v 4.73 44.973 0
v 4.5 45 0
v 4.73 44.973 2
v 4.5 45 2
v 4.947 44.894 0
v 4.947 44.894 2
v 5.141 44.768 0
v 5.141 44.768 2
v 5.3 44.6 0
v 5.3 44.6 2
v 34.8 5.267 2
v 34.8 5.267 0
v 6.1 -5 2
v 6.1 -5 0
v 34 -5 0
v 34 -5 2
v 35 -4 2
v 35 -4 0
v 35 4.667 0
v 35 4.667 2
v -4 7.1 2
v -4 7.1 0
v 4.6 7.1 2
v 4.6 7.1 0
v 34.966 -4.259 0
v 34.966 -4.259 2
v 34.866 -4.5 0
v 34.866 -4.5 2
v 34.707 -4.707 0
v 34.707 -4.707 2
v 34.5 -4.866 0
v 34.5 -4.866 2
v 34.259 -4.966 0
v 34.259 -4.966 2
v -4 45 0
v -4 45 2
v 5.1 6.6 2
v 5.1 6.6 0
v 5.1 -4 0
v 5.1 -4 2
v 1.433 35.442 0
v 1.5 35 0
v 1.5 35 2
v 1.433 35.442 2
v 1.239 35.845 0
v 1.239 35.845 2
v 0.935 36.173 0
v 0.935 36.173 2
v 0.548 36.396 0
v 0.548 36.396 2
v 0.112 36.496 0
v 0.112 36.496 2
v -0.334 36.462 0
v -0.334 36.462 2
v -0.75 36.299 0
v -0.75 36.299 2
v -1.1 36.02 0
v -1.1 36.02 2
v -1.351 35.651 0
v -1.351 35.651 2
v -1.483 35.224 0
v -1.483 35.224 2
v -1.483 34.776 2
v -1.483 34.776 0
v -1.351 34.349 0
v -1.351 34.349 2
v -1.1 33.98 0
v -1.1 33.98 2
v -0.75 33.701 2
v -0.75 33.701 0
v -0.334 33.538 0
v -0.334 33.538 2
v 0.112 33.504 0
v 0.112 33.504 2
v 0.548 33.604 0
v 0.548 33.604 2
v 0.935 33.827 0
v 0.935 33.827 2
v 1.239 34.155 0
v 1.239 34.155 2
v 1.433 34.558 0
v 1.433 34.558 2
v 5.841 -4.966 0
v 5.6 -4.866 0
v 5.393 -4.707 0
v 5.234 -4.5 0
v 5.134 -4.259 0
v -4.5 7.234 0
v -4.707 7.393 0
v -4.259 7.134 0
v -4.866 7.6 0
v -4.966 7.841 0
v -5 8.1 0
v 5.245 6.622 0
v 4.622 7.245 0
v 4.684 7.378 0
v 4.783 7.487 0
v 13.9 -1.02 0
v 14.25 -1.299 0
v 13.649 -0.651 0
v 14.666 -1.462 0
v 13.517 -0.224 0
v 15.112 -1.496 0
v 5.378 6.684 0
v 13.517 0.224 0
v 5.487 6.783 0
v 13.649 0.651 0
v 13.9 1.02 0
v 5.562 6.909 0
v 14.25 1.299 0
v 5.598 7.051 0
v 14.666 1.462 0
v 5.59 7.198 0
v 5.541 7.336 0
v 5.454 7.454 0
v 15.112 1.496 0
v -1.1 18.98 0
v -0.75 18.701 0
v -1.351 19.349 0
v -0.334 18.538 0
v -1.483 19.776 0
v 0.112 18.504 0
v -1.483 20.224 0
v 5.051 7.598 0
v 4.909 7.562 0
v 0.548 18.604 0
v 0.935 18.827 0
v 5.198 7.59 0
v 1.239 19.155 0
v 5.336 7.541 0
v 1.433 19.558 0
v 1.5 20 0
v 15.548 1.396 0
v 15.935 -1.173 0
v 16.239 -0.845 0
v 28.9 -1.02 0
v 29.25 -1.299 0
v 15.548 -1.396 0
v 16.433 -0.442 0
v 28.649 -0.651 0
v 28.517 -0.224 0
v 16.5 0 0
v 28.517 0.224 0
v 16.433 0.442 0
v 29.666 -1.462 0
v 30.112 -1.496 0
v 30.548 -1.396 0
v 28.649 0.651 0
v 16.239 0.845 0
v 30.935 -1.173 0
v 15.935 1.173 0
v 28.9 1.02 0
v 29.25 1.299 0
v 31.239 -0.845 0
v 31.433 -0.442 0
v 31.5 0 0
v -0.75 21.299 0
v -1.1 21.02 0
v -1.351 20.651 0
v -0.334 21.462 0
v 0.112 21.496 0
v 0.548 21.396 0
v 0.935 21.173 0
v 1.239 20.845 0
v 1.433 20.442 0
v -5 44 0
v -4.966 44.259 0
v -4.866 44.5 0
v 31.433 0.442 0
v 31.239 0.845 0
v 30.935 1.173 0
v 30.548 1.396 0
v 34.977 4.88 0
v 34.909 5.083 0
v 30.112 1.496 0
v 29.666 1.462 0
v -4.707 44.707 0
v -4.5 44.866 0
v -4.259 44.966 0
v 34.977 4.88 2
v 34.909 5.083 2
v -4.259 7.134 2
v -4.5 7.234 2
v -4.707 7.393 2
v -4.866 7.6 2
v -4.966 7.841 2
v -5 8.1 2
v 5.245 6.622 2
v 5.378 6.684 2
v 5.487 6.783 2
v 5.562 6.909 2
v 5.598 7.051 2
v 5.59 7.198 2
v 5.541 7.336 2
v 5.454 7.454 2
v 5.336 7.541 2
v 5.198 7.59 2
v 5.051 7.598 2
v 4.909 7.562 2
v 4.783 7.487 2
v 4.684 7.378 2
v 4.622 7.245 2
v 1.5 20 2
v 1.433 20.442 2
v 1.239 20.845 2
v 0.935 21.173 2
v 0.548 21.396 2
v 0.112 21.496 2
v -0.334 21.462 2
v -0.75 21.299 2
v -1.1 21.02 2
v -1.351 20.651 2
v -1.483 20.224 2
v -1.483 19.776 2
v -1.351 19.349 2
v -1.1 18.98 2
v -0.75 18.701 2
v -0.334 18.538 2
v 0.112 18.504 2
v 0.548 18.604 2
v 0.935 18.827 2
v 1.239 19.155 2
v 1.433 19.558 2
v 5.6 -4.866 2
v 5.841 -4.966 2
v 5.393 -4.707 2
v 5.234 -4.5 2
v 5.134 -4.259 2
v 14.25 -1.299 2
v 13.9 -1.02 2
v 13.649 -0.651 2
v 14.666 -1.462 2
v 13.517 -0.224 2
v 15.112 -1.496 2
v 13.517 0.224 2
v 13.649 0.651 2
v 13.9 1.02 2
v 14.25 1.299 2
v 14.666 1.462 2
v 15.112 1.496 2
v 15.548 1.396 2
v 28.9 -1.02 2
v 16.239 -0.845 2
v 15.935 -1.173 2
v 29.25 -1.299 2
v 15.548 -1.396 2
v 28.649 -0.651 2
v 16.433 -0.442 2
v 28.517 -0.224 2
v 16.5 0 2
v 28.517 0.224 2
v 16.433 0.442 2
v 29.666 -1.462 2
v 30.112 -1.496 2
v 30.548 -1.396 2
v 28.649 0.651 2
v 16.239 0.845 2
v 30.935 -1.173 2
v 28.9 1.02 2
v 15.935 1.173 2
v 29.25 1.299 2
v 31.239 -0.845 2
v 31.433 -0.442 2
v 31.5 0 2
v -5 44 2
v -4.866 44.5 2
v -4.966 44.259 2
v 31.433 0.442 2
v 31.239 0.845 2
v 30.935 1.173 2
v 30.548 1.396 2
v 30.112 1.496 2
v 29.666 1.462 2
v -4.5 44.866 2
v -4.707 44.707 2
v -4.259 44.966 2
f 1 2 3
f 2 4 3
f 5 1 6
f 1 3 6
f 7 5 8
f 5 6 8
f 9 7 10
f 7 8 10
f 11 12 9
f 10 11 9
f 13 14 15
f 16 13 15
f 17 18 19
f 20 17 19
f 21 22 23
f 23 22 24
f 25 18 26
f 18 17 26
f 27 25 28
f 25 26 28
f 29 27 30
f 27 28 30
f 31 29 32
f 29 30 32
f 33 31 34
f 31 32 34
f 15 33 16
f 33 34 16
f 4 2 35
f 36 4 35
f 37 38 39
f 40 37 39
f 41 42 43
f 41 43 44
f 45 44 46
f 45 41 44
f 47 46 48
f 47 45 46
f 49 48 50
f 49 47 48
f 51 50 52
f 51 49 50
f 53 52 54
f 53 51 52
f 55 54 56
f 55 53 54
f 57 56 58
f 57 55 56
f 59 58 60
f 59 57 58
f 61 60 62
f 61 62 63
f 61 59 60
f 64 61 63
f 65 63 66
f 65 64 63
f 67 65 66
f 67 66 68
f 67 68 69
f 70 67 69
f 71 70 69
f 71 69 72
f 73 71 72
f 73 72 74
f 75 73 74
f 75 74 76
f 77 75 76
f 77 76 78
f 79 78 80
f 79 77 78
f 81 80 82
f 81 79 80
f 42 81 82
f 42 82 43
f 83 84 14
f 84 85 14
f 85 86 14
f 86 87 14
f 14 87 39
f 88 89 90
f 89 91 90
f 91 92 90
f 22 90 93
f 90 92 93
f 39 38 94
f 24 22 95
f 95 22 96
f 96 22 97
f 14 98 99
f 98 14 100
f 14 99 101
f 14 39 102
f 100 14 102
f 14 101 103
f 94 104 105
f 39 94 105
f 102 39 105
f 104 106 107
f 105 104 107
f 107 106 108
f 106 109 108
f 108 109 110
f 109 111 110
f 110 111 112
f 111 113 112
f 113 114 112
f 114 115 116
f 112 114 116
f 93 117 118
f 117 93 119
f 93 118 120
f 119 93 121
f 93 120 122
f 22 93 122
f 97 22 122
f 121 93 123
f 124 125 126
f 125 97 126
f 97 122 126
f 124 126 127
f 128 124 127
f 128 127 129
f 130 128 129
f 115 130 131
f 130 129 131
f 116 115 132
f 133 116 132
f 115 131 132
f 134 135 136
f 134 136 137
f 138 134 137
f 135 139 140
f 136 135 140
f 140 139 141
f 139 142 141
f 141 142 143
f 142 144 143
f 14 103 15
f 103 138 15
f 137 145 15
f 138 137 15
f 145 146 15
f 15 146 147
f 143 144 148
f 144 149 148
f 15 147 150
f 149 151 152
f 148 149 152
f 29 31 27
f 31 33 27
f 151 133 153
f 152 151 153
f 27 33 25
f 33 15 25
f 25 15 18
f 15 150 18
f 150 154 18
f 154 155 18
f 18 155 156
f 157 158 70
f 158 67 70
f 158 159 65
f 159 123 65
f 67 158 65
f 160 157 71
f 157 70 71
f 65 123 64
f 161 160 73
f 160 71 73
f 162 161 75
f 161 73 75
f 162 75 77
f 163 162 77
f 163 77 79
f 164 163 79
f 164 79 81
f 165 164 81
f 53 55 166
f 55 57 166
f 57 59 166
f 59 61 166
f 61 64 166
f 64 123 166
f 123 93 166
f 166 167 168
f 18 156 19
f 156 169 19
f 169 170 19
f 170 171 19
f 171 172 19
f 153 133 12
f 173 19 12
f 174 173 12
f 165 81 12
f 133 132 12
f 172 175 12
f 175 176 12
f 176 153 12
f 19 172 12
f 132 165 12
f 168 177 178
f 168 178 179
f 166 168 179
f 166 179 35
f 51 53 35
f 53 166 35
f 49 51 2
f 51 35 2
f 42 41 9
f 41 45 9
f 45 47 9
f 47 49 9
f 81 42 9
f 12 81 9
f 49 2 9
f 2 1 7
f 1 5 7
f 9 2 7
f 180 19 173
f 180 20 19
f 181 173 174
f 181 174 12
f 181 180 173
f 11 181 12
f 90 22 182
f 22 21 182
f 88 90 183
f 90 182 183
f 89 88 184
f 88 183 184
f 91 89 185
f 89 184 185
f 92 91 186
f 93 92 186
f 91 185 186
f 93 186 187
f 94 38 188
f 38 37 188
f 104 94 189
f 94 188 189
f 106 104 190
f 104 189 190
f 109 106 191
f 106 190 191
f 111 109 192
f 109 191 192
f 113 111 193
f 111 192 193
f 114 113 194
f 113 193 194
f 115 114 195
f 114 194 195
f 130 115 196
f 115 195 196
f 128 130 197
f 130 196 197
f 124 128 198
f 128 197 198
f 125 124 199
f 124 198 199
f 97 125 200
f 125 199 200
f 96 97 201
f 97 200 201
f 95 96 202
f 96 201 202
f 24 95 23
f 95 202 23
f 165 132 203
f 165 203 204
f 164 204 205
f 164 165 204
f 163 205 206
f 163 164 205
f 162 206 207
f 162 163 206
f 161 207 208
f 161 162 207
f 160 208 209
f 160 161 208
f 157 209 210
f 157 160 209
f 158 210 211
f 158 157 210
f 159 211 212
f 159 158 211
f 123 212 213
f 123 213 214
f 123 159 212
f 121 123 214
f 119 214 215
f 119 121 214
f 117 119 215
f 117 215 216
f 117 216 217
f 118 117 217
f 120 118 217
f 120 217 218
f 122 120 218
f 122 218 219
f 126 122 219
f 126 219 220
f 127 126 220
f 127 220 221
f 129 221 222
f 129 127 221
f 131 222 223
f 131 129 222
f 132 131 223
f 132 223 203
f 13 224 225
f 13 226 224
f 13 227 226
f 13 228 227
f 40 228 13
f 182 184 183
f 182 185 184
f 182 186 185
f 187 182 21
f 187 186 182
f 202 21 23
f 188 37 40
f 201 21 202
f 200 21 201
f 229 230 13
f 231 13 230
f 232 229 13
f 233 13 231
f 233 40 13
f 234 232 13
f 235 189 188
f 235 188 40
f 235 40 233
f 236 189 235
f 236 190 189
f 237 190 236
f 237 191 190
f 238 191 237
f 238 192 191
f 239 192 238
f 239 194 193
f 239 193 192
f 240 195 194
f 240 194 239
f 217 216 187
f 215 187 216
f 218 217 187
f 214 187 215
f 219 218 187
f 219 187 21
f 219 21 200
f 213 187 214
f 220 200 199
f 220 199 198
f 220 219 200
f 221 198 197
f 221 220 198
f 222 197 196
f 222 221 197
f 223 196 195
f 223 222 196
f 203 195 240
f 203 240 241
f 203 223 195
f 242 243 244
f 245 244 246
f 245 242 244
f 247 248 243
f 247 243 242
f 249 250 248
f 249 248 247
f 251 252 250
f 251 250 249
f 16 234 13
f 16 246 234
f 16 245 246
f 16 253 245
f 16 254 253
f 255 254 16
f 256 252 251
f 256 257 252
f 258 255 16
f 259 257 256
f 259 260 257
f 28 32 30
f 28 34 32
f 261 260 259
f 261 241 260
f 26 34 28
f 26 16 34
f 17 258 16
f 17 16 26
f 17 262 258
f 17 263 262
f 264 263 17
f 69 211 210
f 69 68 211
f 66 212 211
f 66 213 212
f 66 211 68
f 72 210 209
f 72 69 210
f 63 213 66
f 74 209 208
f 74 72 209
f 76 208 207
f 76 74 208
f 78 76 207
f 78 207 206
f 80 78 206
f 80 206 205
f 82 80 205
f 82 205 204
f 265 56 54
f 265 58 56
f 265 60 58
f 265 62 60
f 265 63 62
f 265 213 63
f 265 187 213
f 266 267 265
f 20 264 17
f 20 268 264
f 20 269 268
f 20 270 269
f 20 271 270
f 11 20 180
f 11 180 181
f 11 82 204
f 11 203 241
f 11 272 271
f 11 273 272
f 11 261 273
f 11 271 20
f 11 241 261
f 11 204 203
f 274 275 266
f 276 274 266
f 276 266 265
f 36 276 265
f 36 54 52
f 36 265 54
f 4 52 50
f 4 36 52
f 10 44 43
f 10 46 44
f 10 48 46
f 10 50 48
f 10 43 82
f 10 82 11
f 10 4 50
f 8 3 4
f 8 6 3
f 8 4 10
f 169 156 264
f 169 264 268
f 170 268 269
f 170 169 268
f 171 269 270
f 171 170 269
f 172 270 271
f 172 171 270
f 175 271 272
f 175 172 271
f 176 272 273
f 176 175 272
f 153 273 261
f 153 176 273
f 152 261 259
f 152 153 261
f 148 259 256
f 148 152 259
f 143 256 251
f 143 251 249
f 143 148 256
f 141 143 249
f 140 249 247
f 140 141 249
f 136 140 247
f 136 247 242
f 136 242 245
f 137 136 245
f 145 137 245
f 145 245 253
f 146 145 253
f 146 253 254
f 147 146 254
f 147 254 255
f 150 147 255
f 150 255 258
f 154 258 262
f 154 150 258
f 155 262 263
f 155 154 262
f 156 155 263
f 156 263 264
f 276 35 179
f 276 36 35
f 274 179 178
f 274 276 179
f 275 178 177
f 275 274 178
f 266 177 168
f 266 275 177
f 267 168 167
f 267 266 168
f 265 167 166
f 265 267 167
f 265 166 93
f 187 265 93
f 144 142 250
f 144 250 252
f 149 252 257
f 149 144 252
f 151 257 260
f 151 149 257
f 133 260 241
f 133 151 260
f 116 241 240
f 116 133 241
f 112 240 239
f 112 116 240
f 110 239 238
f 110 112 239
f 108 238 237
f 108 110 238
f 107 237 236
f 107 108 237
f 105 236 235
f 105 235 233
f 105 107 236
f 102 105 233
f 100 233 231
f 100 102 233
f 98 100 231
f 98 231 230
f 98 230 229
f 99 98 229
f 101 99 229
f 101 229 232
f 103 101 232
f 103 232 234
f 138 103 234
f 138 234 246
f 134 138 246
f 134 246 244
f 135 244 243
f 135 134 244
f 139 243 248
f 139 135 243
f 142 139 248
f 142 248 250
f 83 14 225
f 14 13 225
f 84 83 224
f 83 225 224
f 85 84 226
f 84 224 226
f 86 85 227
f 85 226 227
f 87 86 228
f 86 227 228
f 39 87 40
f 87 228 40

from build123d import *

# Parameters (mm, degrees)
SKETCH_1_R          = 1.5
EXTRUDE_1_DEPTH     = 2
SKETCH_3_R          = 0.5
CUT_EXTRUDE_3_DEPTH = 10
FILLET_1_R          = 1


with BuildPart() as part:
    # 草图1 → 凸台-拉伸1 (new body)
    with BuildSketch(Plane.XY):
        Polygon((5, 45), (-5, 45), (-5, 15), (-5, 7.1), (5.1, 7.1), (5.1, -5), (15, -5), (35, -5), (35, 5), align=None)
        with Locations((0, 20)):
            Circle(SKETCH_1_R, mode=Mode.SUBTRACT)
        with Locations((15, 0)):
            Circle(SKETCH_1_R, mode=Mode.SUBTRACT)
        with Locations((30, 0)):
            Circle(SKETCH_1_R, mode=Mode.SUBTRACT)
        with Locations((0, 35)):
            Circle(SKETCH_1_R, mode=Mode.SUBTRACT)
    extrude(amount=EXTRUDE_1_DEPTH)

    # 草图3 → 切除-拉伸3 (cut)
    with BuildSketch(Plane.XY.offset(2)):
        with Locations((5.1, 7.1)):
            Circle(SKETCH_3_R)
    extrude(amount=-CUT_EXTRUDE_3_DEPTH, mode=Mode.SUBTRACT)

    # 圆角1
    fillet_1_edges = [part.edges().sort_by_distance(p)[0] for p in [
        (-5, 45, 1),
        (5, 45, 1),
        (35, 5, 1),
        (35, -5, 1),
        (5.1, -5, 1),
        (-5, 7.1, 1),
    ]]
    fillet(fillet_1_edges, radius=FILLET_1_R)


solid = part.part
